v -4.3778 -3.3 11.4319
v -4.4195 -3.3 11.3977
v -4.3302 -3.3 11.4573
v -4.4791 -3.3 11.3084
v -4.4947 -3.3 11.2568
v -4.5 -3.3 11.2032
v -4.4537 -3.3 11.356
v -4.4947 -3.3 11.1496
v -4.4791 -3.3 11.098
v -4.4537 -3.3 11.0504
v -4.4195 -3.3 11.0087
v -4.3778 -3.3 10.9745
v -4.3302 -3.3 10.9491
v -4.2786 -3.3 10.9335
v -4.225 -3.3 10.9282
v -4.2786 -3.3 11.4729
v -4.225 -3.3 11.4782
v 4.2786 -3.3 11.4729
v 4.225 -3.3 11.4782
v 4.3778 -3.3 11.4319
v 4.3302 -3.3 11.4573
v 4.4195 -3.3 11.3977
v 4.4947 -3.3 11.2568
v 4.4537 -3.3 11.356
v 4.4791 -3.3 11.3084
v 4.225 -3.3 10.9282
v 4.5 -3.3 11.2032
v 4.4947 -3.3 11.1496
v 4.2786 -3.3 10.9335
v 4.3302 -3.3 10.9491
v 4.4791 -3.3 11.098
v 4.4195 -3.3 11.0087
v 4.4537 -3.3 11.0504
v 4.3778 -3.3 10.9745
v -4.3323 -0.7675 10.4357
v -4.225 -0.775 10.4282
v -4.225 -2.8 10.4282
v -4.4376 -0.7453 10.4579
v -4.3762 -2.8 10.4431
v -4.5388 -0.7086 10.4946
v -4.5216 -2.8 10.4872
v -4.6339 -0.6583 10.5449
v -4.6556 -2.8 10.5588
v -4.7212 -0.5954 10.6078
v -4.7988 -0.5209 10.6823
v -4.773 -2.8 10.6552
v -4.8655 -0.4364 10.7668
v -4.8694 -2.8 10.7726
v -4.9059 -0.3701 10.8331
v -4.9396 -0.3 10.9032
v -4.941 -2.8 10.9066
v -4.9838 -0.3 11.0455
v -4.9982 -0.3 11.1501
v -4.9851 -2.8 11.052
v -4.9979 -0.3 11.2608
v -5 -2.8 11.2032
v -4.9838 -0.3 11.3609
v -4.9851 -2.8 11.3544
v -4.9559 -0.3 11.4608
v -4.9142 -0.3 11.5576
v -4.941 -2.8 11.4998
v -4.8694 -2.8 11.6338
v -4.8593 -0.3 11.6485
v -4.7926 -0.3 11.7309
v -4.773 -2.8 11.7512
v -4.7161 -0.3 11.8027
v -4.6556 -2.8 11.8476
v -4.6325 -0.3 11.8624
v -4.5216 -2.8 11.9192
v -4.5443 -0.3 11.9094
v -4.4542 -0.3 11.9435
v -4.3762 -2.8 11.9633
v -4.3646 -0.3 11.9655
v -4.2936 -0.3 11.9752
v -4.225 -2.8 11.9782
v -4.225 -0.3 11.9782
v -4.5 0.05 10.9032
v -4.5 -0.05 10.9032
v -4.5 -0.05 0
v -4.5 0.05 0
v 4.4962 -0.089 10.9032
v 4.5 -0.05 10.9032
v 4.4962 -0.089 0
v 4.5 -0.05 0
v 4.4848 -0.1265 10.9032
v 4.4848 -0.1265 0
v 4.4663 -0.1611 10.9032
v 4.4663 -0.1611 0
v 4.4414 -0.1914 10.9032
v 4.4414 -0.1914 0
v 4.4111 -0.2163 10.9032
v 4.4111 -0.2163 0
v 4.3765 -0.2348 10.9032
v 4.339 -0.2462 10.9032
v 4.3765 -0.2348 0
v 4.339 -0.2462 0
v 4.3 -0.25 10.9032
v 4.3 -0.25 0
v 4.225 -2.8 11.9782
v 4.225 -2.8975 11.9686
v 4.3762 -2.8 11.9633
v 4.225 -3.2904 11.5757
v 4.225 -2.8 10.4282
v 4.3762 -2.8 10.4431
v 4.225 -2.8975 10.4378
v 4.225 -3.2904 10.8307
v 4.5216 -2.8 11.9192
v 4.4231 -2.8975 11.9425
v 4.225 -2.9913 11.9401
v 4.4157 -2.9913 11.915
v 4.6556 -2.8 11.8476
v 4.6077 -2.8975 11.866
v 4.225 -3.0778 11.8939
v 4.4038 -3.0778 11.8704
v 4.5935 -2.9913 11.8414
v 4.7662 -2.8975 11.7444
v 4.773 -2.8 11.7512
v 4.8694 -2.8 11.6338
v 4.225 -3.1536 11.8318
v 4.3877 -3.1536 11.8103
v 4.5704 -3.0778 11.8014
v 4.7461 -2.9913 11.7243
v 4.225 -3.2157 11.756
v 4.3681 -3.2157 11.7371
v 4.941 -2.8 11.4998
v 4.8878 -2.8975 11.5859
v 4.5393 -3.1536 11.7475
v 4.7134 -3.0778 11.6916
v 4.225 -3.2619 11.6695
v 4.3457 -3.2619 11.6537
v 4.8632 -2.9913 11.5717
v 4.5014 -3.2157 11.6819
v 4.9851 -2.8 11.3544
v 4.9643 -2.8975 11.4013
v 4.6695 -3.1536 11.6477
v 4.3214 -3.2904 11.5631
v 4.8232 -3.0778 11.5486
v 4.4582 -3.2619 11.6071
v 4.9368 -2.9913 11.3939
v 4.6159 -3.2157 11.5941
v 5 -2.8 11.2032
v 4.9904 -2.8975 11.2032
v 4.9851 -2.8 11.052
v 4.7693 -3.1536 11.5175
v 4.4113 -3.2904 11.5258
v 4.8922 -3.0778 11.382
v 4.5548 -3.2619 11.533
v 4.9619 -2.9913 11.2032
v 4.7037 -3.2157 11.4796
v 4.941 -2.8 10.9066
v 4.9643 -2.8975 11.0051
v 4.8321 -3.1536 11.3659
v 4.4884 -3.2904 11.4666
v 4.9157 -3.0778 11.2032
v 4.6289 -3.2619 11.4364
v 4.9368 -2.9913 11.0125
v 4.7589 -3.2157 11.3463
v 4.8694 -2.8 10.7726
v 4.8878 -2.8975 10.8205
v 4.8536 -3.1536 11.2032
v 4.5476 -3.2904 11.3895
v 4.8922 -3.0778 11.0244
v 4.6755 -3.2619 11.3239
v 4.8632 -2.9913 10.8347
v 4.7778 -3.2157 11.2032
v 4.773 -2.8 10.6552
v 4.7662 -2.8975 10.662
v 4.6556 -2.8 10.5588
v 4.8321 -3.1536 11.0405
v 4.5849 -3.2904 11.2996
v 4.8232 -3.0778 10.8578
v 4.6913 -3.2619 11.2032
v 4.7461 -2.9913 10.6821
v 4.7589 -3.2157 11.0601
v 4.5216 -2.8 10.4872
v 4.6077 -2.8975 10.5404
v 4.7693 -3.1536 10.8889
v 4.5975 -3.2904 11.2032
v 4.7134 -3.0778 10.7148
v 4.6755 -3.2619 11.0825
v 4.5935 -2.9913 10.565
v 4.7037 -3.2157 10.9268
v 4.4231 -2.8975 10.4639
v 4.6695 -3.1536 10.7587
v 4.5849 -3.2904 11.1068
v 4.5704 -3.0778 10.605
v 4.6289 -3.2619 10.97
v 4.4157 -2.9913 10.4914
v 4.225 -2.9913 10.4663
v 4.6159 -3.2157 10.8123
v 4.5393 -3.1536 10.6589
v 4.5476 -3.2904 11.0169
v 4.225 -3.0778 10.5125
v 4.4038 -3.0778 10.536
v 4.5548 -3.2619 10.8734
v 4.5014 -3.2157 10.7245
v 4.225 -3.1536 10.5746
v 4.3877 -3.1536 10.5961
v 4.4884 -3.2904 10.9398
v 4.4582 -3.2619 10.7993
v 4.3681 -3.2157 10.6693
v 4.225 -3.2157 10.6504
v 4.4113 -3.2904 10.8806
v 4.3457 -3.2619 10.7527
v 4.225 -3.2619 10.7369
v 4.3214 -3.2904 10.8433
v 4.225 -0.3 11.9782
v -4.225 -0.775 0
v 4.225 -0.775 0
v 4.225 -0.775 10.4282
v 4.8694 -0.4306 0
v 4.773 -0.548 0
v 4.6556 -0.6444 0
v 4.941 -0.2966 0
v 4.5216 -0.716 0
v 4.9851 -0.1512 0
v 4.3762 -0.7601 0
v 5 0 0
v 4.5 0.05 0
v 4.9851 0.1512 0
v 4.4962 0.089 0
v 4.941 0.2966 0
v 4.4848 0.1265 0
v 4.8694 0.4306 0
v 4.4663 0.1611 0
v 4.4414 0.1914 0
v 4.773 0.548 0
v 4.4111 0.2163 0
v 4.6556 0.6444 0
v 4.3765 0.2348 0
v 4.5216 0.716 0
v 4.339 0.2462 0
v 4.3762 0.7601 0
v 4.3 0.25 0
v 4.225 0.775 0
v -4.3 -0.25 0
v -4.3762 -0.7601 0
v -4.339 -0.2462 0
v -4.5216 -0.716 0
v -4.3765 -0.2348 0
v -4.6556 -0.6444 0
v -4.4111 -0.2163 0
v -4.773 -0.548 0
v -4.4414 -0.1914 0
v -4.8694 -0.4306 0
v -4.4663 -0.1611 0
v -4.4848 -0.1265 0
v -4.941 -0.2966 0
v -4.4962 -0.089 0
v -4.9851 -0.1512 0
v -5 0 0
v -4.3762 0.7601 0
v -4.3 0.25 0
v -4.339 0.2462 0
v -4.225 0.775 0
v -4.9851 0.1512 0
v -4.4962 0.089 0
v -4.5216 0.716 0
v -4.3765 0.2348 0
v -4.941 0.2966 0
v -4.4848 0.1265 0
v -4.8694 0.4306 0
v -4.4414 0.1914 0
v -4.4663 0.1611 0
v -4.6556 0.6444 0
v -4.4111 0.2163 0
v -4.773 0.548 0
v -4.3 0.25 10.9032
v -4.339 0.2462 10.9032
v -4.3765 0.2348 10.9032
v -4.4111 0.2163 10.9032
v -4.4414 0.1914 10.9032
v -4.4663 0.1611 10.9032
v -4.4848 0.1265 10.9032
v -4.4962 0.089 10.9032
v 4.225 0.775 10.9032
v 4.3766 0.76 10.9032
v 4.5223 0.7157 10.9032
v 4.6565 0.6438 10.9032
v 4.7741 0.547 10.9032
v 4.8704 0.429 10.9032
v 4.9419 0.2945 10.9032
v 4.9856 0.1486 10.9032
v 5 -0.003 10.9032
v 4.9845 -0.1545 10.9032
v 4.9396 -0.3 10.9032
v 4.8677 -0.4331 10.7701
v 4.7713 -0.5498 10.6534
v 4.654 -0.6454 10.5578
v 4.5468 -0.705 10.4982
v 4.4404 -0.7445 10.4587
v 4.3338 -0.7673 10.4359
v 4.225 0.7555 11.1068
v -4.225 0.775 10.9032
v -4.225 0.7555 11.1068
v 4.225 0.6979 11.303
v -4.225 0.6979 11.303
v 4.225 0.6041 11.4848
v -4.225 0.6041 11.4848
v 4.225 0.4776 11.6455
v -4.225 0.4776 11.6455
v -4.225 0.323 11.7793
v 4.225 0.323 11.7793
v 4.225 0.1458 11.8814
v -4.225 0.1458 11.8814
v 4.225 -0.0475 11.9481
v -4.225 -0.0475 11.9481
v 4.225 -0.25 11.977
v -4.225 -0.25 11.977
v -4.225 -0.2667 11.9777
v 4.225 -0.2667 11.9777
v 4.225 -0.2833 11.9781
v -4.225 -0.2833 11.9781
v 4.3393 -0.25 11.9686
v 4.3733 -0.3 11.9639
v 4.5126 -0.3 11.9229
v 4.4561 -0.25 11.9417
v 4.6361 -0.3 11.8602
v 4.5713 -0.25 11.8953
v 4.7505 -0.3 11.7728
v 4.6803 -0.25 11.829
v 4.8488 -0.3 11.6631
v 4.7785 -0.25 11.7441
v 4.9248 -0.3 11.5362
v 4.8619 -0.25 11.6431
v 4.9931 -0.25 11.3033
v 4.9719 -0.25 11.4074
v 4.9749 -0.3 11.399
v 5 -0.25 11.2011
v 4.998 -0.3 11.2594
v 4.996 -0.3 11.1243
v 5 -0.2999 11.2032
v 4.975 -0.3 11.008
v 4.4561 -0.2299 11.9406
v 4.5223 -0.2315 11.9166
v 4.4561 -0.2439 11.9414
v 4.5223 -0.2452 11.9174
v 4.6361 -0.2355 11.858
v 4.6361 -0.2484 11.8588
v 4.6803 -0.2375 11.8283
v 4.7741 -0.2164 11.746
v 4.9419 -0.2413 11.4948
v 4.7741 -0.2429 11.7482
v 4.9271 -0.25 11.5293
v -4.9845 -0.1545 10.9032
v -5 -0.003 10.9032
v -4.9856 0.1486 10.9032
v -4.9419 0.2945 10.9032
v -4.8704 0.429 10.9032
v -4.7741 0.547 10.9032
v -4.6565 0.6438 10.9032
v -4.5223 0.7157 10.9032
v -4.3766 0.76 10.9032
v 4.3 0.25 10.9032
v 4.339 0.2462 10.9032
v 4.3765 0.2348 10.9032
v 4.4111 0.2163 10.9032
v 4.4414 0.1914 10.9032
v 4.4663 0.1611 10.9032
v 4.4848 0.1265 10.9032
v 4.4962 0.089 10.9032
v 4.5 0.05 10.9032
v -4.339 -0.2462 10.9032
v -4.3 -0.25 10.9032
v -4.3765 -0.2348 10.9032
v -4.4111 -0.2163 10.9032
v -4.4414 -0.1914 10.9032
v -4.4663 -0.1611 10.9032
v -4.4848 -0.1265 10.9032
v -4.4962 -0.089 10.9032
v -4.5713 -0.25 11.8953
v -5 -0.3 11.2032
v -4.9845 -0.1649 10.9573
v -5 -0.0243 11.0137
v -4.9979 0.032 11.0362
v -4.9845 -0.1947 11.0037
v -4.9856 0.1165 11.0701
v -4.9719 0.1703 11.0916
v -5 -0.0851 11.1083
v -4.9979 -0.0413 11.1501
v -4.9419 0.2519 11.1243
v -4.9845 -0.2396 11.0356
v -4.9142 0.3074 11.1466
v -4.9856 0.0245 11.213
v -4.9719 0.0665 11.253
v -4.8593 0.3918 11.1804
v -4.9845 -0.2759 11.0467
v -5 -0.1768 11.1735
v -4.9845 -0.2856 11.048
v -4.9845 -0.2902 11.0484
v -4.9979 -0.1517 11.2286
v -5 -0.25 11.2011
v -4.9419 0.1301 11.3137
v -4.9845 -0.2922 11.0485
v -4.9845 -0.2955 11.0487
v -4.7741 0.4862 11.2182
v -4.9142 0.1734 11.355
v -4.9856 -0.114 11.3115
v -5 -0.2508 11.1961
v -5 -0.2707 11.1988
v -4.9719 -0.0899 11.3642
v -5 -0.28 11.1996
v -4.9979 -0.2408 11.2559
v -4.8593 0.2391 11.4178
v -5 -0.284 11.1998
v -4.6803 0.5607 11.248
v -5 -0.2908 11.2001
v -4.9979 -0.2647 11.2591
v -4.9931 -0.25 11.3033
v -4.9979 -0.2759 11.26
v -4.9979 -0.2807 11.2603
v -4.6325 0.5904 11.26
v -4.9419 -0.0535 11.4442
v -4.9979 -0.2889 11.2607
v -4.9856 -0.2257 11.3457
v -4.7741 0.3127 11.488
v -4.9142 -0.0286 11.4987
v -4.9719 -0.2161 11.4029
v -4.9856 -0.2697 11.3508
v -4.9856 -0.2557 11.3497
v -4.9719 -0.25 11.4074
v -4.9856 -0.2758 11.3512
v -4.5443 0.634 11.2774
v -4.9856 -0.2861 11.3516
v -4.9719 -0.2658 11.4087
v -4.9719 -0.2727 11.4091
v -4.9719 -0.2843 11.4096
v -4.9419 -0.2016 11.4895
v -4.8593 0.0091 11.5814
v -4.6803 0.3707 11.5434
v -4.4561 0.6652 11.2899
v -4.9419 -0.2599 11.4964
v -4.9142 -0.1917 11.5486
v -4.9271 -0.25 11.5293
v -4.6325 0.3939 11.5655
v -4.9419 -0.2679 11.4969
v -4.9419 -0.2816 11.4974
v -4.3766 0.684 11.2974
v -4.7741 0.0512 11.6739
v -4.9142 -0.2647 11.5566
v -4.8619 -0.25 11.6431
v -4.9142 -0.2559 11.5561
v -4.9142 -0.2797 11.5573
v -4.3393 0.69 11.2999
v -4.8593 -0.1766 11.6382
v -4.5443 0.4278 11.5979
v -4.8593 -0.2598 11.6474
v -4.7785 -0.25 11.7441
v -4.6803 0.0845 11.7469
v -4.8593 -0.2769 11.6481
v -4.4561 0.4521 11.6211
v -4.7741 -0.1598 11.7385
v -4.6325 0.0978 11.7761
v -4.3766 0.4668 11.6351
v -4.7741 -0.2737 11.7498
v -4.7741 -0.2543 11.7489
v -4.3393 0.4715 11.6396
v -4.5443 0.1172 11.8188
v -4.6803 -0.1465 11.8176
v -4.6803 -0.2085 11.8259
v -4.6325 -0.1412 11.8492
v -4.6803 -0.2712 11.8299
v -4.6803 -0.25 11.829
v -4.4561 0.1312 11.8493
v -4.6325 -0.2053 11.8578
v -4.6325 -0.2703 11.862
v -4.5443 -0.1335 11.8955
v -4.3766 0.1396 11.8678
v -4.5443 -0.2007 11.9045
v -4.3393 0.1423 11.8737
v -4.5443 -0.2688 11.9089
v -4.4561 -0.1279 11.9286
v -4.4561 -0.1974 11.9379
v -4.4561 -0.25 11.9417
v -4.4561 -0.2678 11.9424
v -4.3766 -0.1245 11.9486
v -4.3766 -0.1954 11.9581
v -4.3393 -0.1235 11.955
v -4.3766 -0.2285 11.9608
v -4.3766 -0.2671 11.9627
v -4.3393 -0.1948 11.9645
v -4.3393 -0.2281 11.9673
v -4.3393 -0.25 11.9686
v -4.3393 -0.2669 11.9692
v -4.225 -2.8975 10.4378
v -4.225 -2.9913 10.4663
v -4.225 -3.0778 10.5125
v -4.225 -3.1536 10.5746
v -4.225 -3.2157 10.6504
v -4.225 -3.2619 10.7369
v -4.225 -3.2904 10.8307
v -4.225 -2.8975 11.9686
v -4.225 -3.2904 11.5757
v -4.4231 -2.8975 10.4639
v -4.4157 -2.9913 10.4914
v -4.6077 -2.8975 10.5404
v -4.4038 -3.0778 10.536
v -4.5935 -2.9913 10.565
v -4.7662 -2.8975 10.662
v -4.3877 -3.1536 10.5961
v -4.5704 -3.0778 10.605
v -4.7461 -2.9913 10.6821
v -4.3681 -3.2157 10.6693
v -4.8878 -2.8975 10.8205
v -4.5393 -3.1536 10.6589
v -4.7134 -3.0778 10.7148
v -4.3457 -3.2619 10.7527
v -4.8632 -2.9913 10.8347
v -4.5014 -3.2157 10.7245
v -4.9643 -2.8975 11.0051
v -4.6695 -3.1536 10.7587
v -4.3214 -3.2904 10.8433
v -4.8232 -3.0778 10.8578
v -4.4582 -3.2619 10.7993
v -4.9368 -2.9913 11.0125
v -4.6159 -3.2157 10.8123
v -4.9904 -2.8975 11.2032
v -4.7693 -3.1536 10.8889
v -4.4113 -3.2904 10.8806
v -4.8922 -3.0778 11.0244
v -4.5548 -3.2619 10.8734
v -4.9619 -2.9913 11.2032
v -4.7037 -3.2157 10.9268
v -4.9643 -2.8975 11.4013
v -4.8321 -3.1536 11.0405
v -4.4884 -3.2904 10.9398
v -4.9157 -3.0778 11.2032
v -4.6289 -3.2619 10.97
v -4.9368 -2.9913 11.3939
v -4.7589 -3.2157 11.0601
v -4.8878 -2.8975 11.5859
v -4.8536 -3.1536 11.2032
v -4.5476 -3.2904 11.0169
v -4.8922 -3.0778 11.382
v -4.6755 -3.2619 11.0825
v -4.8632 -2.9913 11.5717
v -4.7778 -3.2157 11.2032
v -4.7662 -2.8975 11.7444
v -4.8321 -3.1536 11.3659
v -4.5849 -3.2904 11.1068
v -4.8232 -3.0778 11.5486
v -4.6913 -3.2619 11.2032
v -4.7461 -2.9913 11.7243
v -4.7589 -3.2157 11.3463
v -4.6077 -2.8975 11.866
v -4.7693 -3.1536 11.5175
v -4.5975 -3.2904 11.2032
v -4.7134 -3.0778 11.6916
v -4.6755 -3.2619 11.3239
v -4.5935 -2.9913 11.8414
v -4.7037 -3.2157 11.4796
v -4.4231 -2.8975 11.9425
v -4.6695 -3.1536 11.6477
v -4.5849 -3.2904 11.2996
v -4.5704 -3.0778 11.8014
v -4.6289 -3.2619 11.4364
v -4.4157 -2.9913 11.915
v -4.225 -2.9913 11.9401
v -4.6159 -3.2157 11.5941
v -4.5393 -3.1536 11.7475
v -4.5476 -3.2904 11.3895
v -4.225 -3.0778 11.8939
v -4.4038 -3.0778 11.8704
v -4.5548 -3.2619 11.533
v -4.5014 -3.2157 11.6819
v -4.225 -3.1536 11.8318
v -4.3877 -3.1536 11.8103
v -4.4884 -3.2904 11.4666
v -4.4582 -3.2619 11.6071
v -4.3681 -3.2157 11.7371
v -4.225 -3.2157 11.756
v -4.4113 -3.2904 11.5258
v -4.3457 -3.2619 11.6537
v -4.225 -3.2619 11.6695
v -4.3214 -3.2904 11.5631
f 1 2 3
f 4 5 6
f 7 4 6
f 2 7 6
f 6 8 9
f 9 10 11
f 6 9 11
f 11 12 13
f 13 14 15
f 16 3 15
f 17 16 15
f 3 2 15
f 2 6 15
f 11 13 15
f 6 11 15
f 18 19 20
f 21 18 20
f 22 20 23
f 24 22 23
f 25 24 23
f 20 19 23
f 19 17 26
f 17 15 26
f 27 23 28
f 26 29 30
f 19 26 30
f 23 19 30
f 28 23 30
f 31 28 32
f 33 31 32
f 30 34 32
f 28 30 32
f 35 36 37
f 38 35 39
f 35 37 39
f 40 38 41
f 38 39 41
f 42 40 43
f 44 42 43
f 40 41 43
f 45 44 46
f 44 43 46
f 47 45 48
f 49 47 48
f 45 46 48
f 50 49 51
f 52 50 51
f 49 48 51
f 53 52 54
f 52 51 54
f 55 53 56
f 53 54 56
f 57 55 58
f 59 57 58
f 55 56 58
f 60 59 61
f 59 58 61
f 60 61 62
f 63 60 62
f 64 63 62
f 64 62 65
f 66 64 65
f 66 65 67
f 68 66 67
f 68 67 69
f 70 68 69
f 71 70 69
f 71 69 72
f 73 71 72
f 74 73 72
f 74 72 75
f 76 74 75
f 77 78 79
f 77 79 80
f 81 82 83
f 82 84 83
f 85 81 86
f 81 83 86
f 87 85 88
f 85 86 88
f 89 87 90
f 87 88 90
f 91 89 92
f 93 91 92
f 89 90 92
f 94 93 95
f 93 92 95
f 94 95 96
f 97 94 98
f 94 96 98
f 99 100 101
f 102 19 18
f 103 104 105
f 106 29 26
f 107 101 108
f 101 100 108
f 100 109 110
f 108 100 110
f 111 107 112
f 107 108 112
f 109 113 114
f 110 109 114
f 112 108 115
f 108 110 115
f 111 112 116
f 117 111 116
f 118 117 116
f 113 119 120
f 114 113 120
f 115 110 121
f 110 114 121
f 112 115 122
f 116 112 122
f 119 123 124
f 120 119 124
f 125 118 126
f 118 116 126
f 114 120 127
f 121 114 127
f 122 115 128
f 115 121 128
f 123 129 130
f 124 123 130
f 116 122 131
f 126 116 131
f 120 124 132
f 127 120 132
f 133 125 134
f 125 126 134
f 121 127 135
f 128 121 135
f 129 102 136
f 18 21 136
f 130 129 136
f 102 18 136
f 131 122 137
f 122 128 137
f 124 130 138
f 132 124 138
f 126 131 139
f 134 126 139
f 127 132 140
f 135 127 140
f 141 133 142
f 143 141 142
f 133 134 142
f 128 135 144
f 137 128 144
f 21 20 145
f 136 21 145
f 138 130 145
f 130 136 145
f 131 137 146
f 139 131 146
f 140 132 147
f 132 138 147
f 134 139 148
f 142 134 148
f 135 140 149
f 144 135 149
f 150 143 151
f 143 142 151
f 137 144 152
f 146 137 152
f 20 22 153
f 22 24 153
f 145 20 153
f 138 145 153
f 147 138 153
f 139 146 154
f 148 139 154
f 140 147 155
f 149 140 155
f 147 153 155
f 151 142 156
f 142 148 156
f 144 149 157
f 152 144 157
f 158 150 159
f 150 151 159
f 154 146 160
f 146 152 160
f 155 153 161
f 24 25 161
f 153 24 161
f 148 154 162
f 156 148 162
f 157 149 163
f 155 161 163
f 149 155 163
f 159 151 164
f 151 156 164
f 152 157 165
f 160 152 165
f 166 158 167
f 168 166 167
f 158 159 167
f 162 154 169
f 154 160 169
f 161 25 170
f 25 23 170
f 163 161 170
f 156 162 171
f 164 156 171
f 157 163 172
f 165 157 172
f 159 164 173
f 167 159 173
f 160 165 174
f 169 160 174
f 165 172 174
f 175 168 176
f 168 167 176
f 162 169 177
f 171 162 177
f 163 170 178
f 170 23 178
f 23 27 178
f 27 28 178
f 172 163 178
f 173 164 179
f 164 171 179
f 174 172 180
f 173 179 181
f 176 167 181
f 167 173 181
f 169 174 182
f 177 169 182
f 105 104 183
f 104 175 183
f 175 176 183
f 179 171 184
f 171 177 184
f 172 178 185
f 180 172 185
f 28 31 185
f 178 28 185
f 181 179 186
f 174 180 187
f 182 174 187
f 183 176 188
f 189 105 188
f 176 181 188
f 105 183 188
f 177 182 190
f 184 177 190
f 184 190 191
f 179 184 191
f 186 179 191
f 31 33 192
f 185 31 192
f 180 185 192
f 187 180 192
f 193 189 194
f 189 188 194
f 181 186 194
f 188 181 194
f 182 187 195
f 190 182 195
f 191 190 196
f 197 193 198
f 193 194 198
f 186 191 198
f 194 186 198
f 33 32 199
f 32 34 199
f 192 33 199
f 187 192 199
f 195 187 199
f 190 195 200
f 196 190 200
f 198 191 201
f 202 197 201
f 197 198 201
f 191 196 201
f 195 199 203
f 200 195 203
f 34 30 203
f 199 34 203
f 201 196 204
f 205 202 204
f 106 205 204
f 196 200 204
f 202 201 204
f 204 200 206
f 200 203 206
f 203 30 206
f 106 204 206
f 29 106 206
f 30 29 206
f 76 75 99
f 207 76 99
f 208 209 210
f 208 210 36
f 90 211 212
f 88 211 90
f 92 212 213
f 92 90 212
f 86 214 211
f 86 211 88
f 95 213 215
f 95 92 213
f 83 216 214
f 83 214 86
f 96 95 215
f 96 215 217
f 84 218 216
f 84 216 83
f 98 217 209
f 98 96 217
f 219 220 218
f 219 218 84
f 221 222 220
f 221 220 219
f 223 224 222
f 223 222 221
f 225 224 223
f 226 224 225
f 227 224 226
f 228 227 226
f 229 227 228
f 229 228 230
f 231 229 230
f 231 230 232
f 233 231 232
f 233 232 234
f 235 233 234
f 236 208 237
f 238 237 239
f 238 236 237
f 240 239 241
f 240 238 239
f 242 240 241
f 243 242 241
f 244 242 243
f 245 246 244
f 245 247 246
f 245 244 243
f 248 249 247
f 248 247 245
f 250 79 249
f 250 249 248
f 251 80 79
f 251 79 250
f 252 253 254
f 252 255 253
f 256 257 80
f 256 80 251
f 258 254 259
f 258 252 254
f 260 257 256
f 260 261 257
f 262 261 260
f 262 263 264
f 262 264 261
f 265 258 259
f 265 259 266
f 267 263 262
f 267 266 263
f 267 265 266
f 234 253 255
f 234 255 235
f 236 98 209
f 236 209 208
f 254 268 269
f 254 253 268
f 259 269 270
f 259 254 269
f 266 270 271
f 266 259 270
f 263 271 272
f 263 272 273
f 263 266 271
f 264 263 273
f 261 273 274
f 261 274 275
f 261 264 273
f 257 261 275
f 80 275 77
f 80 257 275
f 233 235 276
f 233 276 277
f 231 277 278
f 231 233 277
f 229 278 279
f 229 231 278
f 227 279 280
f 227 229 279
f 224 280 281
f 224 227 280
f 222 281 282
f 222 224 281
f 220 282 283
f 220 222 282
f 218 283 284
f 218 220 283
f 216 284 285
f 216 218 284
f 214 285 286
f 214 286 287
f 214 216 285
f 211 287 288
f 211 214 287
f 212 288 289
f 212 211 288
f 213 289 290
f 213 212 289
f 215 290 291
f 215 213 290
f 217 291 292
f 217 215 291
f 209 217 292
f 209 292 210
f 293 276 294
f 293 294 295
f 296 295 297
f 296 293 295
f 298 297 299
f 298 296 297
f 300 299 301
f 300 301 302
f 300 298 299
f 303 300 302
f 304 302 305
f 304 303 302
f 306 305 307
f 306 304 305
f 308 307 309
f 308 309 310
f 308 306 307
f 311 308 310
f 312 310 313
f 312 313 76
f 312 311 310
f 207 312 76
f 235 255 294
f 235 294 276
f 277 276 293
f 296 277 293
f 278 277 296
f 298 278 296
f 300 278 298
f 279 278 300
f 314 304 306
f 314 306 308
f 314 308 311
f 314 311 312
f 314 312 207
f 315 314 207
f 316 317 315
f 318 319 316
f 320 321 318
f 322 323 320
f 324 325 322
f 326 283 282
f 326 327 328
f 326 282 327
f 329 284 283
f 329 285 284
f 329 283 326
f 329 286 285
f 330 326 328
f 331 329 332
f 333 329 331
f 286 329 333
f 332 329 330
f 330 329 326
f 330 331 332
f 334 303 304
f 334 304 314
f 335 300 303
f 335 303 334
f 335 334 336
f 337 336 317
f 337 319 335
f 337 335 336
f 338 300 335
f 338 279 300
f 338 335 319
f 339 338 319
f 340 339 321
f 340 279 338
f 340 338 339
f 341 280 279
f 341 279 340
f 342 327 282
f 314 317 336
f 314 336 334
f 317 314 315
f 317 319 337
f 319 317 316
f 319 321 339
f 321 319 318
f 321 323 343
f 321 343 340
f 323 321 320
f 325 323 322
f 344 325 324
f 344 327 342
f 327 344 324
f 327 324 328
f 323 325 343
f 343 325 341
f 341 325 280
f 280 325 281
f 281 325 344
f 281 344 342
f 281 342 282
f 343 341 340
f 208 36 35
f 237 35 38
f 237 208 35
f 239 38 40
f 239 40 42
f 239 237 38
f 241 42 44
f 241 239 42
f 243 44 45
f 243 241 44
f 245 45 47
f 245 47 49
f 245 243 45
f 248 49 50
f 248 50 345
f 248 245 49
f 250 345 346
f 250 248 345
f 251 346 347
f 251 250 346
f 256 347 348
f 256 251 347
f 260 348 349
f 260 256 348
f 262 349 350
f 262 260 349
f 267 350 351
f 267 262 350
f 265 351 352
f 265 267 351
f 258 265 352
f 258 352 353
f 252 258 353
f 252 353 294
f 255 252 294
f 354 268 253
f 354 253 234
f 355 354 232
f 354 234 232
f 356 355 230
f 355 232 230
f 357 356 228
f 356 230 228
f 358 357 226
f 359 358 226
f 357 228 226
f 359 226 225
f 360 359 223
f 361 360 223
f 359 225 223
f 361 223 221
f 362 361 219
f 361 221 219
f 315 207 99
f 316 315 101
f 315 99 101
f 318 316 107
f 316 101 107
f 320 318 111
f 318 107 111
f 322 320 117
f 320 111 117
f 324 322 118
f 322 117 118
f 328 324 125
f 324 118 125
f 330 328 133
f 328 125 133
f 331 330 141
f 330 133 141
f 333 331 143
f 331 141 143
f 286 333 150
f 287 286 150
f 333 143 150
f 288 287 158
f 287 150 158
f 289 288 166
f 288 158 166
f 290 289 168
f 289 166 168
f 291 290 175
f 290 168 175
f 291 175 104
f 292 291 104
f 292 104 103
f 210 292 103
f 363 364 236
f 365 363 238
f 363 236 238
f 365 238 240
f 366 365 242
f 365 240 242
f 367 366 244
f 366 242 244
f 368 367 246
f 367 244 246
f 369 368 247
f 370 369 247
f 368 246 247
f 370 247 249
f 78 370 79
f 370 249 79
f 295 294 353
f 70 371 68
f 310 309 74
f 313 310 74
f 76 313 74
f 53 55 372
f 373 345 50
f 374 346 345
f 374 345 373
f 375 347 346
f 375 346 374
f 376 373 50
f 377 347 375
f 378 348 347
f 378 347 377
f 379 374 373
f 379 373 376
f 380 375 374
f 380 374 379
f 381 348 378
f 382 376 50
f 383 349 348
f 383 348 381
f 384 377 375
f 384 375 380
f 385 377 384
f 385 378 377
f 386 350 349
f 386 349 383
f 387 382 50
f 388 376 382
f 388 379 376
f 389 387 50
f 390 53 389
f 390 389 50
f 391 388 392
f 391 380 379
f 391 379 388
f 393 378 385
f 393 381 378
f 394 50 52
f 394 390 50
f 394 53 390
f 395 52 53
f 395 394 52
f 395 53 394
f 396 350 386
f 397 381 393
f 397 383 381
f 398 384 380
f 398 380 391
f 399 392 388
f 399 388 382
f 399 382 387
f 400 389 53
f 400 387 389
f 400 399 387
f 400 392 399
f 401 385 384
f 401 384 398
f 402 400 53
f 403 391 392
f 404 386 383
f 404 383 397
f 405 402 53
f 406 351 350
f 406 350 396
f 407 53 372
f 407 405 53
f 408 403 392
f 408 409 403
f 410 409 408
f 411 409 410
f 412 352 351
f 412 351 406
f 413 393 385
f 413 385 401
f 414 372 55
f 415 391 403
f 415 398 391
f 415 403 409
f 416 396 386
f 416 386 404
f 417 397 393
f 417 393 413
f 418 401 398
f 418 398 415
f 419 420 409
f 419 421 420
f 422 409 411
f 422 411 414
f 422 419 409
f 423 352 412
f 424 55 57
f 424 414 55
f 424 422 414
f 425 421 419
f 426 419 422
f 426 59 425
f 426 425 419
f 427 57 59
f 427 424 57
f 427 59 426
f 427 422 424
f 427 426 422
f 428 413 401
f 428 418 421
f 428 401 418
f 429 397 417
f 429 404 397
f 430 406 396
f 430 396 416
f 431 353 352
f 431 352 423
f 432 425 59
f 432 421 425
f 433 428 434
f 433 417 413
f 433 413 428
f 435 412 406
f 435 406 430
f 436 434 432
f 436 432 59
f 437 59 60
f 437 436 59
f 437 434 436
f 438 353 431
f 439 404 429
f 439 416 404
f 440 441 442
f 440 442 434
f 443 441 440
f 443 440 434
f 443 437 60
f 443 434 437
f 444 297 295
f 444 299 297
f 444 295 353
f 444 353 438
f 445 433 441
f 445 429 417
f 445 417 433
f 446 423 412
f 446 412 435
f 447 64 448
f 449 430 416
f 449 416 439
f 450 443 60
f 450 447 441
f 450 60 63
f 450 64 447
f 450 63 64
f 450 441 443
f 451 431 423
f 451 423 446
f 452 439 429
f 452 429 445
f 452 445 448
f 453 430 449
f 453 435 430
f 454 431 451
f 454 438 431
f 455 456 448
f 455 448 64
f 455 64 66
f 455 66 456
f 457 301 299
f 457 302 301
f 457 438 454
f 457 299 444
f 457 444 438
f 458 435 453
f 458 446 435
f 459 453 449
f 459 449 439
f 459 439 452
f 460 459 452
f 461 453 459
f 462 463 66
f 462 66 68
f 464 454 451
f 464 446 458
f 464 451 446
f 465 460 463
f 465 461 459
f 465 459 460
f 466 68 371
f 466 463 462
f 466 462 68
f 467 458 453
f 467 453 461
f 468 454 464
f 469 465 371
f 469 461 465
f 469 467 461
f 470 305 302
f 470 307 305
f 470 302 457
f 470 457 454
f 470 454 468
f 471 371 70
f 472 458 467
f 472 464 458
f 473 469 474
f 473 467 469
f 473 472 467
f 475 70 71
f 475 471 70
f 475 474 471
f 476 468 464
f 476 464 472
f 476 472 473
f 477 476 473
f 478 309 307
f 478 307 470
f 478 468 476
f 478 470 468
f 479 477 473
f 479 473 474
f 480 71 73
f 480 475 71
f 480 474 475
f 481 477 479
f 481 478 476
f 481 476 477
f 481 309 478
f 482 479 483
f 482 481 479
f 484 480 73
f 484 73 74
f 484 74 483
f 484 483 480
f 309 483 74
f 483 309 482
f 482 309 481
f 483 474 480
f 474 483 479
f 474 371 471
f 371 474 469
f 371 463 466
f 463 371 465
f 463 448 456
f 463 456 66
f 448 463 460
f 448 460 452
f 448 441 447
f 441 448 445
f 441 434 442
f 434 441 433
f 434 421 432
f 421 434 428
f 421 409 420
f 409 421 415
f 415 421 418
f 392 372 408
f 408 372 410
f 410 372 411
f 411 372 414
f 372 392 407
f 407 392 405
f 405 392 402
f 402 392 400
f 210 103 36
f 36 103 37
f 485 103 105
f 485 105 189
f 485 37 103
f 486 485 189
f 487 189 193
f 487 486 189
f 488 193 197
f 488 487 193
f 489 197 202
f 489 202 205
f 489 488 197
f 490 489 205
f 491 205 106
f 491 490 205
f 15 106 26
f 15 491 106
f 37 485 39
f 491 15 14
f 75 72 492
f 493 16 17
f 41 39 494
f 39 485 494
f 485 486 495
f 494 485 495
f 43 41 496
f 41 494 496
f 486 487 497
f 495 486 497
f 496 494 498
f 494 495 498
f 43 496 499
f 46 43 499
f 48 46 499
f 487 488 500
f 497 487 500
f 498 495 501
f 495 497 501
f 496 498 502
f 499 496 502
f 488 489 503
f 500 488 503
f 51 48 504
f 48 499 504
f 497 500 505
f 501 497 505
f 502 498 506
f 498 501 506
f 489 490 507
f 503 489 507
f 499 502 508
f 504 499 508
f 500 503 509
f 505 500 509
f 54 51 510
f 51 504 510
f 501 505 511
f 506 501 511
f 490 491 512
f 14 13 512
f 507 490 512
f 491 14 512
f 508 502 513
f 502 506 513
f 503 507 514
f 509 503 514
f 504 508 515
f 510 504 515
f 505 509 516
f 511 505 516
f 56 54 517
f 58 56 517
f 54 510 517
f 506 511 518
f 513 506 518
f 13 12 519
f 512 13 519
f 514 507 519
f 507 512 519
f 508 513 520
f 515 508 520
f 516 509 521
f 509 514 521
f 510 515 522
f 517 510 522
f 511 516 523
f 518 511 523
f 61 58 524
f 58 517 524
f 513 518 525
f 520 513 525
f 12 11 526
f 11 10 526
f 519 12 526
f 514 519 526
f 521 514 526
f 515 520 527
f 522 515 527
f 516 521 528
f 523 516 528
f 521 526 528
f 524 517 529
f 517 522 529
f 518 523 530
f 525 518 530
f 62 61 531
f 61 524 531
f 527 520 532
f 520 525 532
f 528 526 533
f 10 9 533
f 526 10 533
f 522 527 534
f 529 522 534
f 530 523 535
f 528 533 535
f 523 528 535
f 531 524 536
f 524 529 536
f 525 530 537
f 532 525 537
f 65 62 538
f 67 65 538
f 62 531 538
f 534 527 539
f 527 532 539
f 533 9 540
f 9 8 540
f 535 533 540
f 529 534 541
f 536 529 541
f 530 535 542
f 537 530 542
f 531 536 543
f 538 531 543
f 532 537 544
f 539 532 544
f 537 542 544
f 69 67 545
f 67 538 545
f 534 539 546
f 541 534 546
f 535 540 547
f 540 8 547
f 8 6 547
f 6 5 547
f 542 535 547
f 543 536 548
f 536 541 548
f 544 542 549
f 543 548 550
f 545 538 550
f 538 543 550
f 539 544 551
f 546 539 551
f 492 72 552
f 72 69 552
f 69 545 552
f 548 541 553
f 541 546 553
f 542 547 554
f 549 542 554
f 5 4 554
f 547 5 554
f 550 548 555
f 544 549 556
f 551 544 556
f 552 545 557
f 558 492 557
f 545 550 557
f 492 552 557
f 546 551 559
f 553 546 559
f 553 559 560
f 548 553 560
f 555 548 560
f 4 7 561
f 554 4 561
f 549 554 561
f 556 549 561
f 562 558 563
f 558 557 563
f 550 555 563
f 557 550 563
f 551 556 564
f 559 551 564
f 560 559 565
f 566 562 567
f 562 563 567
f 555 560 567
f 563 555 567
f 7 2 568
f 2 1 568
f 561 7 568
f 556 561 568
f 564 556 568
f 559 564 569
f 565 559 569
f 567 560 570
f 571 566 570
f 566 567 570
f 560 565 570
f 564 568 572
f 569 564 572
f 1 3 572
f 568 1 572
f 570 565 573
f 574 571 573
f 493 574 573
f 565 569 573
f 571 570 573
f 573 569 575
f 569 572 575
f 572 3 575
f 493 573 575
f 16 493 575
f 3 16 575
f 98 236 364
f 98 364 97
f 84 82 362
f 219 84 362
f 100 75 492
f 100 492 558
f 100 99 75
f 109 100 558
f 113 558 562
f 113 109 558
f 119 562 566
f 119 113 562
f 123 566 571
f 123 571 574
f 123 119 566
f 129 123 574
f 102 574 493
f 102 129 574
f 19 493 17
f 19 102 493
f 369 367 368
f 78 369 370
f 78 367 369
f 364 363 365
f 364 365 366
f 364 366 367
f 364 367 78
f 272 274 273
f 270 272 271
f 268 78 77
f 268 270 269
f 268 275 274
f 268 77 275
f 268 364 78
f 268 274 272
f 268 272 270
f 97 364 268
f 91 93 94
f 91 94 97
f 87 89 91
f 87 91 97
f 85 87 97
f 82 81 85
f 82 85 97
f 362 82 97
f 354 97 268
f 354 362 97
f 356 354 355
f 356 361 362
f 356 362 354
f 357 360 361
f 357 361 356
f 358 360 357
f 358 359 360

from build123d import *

# Parameters (mm, degrees)
BOSS_EXTRUDE1_DEPTH = 10.9032
SKETCH2_W           = 9
SKETCH2_H           = 0.5
CUT_EXTRUDE1_DEPTH  = 13.01999980199667
FILLET1_R           = 0.2
SWEEP1_START        = -3.3
SWEEP1_DEPTH        = 3.05
SWEEP1_2_ANGLE      = 90
FILLET2_R           = 0.5


with BuildPart() as part:
    # Sketch1 → Boss-Extrude1 (new body)
    with BuildSketch(Plane.XY):
        with BuildLine():
            Line((-4.225, 0.7750000000000001), (4.225, 0.7750000000000001))
            ThreePointArc((4.225, 0.7750000000000001), (5, 0), (4.225, -0.7750000000000001))
            Line((4.225, -0.7750000000000001), (-4.225, -0.7750000000000001))
            ThreePointArc((-4.225, -0.7750000000000001), (-5, 9e-17), (-4.225, 0.7750000000000001))
        make_face()
    extrude(amount=BOSS_EXTRUDE1_DEPTH)

    # Sketch2 → Cut-Extrude1 (cut, through all)
    with BuildSketch(Plane.XY.offset(10.9032)):
        Rectangle(SKETCH2_W, SKETCH2_H)
    extrude(amount=-CUT_EXTRUDE1_DEPTH, mode=Mode.SUBTRACT)

    # Fillet1
    fillet1_edges = [part.edges().sort_by_distance(p)[0] for p in [
        (4.500000000000003, 0.2500000000000001, 5.4516),
        (4.500000000000003, -0.2499999999999999, 5.4516),
        (-4.499999999999997, -0.2499999999999999, 5.4516),
        (-4.499999999999997, 0.2500000000000001, 5.4516),
    ]]
    fillet(fillet1_edges, radius=FILLET1_R)

    # Sweep1: read off the stored shape, not the designer's step
    # Sweep1 outline → Sweep1 (add)
    with BuildSketch(Plane(origin=(0, 0, 0), x_dir=(1, 0, 0), z_dir=(0, 1, 0)).offset(SWEEP1_START)):
        with BuildLine():
            Line((-4.225, -11.9782), (4.225, -11.9782))
            ThreePointArc((4.225, -11.9782), (5, -11.2032), (4.225, -10.4282))
            Line((4.225, -10.4282), (-4.225, -10.4282))
            ThreePointArc((-4.225, -10.4282), (-5, -11.2032), (-4.225, -11.9782))
        make_face()
    extrude(amount=SWEEP1_DEPTH)

    # Sweep1 2 outline → Sweep1 2 (revolve)
    with BuildSketch(Plane(origin=(0, -0.3, 10.9032), x_dir=(0, 1, -1.44e-15), z_dir=(0, -1.44e-15, -1))):
        with BuildLine():
            Line((0, 4.939580296), (0, -4.939580296))
            add(Edge.make_bspline(
                [(0, -4.939580296), (0.0519570394689895, -4.961393256983593), (0.10841554643003581, -4.979542137191699), (0.1692061790231751, -4.992872607462927), (0.23352242585972577, -5.000000001245932), (0.538087621369197, -4.999999995537749), (0.8228689184127496, -4.905109045106682), (1.0076156687544926, -4.675143876063141), (1.075000000000001, -4.4268164646885895), (1.075, -4.225)],
                knots=[1.5386603530075902, 1.5386603530075902, 1.5386603530075902, 1.5386603530075902, 1.5386603530075902, 1.5386603530075902, 1.968277128944731, 1.968277128944731, 1.968277128944731, 1.968277128944731, 3.5069374819523116, 3.5069374819523116, 3.5069374819523116, 3.5069374819523116, 3.5069374819523116, 3.5069374819523116], degree=5, weights=[1, 0.9999999999999993, 1.0001144222703127, 1.000064472262904, 1.0000000000000007, 1.0000000000000002, 0.9635119774531175, 0.9749056251717576, 1.000000000000001, 1]))
            Line((1.075, -4.225), (1.075, 4.225))
            add(Edge.make_bspline(
                [(1.075, 4.225), (1.0750000000000006, 4.426816468221435), (1.0076156662304492, 4.6751438856768095), (0.8228689080824526, 4.905109057133026), (0.5380876027644639, 5.000000001939648), (0.23352240972853552, 4.999999999458421), (0.16920616758934218, 4.992872604955472), (0.10841553935261468, 4.97954213491664), (0.05195703621157381, 4.961393255616055), (0, 4.939580296)],
                knots=[4.744524927237428, 4.744524927237428, 4.744524927237428, 4.744524927237428, 4.744524927237428, 4.744524927237428, 6.283185307179587, 6.283185307179587, 6.283185307179587, 6.283185307179587, 6.712802056182165, 6.712802056182165, 6.712802056182165, 6.712802056182165, 6.712802056182165, 6.712802056182165], degree=5, weights=[1, 0.9999999999999987, 0.9749056227861467, 0.9635119748925262, 1.0000000000000018, 1.0000000000000044, 1.0000644722550744, 1.0001144222464367, 0.999999999999996, 1]))
        make_face()
    revolve(axis=Axis((0, -0.3, 10.9032), (1, 0, 0)), revolution_arc=SWEEP1_2_ANGLE)

    # Fillet2
    fillet2_edges = [part.edges().sort_by_distance(p)[0] for p in [
        (-4.999999999999999, -3.3, 11.203199999999999),
        (0, -3.3, 10.4282),
        (4.999999999999999, -3.3, 11.203199999999999),
        (0, -3.3, 11.9782),
    ]]
    fillet(fillet2_edges, radius=FILLET2_R)


solid = part.part
